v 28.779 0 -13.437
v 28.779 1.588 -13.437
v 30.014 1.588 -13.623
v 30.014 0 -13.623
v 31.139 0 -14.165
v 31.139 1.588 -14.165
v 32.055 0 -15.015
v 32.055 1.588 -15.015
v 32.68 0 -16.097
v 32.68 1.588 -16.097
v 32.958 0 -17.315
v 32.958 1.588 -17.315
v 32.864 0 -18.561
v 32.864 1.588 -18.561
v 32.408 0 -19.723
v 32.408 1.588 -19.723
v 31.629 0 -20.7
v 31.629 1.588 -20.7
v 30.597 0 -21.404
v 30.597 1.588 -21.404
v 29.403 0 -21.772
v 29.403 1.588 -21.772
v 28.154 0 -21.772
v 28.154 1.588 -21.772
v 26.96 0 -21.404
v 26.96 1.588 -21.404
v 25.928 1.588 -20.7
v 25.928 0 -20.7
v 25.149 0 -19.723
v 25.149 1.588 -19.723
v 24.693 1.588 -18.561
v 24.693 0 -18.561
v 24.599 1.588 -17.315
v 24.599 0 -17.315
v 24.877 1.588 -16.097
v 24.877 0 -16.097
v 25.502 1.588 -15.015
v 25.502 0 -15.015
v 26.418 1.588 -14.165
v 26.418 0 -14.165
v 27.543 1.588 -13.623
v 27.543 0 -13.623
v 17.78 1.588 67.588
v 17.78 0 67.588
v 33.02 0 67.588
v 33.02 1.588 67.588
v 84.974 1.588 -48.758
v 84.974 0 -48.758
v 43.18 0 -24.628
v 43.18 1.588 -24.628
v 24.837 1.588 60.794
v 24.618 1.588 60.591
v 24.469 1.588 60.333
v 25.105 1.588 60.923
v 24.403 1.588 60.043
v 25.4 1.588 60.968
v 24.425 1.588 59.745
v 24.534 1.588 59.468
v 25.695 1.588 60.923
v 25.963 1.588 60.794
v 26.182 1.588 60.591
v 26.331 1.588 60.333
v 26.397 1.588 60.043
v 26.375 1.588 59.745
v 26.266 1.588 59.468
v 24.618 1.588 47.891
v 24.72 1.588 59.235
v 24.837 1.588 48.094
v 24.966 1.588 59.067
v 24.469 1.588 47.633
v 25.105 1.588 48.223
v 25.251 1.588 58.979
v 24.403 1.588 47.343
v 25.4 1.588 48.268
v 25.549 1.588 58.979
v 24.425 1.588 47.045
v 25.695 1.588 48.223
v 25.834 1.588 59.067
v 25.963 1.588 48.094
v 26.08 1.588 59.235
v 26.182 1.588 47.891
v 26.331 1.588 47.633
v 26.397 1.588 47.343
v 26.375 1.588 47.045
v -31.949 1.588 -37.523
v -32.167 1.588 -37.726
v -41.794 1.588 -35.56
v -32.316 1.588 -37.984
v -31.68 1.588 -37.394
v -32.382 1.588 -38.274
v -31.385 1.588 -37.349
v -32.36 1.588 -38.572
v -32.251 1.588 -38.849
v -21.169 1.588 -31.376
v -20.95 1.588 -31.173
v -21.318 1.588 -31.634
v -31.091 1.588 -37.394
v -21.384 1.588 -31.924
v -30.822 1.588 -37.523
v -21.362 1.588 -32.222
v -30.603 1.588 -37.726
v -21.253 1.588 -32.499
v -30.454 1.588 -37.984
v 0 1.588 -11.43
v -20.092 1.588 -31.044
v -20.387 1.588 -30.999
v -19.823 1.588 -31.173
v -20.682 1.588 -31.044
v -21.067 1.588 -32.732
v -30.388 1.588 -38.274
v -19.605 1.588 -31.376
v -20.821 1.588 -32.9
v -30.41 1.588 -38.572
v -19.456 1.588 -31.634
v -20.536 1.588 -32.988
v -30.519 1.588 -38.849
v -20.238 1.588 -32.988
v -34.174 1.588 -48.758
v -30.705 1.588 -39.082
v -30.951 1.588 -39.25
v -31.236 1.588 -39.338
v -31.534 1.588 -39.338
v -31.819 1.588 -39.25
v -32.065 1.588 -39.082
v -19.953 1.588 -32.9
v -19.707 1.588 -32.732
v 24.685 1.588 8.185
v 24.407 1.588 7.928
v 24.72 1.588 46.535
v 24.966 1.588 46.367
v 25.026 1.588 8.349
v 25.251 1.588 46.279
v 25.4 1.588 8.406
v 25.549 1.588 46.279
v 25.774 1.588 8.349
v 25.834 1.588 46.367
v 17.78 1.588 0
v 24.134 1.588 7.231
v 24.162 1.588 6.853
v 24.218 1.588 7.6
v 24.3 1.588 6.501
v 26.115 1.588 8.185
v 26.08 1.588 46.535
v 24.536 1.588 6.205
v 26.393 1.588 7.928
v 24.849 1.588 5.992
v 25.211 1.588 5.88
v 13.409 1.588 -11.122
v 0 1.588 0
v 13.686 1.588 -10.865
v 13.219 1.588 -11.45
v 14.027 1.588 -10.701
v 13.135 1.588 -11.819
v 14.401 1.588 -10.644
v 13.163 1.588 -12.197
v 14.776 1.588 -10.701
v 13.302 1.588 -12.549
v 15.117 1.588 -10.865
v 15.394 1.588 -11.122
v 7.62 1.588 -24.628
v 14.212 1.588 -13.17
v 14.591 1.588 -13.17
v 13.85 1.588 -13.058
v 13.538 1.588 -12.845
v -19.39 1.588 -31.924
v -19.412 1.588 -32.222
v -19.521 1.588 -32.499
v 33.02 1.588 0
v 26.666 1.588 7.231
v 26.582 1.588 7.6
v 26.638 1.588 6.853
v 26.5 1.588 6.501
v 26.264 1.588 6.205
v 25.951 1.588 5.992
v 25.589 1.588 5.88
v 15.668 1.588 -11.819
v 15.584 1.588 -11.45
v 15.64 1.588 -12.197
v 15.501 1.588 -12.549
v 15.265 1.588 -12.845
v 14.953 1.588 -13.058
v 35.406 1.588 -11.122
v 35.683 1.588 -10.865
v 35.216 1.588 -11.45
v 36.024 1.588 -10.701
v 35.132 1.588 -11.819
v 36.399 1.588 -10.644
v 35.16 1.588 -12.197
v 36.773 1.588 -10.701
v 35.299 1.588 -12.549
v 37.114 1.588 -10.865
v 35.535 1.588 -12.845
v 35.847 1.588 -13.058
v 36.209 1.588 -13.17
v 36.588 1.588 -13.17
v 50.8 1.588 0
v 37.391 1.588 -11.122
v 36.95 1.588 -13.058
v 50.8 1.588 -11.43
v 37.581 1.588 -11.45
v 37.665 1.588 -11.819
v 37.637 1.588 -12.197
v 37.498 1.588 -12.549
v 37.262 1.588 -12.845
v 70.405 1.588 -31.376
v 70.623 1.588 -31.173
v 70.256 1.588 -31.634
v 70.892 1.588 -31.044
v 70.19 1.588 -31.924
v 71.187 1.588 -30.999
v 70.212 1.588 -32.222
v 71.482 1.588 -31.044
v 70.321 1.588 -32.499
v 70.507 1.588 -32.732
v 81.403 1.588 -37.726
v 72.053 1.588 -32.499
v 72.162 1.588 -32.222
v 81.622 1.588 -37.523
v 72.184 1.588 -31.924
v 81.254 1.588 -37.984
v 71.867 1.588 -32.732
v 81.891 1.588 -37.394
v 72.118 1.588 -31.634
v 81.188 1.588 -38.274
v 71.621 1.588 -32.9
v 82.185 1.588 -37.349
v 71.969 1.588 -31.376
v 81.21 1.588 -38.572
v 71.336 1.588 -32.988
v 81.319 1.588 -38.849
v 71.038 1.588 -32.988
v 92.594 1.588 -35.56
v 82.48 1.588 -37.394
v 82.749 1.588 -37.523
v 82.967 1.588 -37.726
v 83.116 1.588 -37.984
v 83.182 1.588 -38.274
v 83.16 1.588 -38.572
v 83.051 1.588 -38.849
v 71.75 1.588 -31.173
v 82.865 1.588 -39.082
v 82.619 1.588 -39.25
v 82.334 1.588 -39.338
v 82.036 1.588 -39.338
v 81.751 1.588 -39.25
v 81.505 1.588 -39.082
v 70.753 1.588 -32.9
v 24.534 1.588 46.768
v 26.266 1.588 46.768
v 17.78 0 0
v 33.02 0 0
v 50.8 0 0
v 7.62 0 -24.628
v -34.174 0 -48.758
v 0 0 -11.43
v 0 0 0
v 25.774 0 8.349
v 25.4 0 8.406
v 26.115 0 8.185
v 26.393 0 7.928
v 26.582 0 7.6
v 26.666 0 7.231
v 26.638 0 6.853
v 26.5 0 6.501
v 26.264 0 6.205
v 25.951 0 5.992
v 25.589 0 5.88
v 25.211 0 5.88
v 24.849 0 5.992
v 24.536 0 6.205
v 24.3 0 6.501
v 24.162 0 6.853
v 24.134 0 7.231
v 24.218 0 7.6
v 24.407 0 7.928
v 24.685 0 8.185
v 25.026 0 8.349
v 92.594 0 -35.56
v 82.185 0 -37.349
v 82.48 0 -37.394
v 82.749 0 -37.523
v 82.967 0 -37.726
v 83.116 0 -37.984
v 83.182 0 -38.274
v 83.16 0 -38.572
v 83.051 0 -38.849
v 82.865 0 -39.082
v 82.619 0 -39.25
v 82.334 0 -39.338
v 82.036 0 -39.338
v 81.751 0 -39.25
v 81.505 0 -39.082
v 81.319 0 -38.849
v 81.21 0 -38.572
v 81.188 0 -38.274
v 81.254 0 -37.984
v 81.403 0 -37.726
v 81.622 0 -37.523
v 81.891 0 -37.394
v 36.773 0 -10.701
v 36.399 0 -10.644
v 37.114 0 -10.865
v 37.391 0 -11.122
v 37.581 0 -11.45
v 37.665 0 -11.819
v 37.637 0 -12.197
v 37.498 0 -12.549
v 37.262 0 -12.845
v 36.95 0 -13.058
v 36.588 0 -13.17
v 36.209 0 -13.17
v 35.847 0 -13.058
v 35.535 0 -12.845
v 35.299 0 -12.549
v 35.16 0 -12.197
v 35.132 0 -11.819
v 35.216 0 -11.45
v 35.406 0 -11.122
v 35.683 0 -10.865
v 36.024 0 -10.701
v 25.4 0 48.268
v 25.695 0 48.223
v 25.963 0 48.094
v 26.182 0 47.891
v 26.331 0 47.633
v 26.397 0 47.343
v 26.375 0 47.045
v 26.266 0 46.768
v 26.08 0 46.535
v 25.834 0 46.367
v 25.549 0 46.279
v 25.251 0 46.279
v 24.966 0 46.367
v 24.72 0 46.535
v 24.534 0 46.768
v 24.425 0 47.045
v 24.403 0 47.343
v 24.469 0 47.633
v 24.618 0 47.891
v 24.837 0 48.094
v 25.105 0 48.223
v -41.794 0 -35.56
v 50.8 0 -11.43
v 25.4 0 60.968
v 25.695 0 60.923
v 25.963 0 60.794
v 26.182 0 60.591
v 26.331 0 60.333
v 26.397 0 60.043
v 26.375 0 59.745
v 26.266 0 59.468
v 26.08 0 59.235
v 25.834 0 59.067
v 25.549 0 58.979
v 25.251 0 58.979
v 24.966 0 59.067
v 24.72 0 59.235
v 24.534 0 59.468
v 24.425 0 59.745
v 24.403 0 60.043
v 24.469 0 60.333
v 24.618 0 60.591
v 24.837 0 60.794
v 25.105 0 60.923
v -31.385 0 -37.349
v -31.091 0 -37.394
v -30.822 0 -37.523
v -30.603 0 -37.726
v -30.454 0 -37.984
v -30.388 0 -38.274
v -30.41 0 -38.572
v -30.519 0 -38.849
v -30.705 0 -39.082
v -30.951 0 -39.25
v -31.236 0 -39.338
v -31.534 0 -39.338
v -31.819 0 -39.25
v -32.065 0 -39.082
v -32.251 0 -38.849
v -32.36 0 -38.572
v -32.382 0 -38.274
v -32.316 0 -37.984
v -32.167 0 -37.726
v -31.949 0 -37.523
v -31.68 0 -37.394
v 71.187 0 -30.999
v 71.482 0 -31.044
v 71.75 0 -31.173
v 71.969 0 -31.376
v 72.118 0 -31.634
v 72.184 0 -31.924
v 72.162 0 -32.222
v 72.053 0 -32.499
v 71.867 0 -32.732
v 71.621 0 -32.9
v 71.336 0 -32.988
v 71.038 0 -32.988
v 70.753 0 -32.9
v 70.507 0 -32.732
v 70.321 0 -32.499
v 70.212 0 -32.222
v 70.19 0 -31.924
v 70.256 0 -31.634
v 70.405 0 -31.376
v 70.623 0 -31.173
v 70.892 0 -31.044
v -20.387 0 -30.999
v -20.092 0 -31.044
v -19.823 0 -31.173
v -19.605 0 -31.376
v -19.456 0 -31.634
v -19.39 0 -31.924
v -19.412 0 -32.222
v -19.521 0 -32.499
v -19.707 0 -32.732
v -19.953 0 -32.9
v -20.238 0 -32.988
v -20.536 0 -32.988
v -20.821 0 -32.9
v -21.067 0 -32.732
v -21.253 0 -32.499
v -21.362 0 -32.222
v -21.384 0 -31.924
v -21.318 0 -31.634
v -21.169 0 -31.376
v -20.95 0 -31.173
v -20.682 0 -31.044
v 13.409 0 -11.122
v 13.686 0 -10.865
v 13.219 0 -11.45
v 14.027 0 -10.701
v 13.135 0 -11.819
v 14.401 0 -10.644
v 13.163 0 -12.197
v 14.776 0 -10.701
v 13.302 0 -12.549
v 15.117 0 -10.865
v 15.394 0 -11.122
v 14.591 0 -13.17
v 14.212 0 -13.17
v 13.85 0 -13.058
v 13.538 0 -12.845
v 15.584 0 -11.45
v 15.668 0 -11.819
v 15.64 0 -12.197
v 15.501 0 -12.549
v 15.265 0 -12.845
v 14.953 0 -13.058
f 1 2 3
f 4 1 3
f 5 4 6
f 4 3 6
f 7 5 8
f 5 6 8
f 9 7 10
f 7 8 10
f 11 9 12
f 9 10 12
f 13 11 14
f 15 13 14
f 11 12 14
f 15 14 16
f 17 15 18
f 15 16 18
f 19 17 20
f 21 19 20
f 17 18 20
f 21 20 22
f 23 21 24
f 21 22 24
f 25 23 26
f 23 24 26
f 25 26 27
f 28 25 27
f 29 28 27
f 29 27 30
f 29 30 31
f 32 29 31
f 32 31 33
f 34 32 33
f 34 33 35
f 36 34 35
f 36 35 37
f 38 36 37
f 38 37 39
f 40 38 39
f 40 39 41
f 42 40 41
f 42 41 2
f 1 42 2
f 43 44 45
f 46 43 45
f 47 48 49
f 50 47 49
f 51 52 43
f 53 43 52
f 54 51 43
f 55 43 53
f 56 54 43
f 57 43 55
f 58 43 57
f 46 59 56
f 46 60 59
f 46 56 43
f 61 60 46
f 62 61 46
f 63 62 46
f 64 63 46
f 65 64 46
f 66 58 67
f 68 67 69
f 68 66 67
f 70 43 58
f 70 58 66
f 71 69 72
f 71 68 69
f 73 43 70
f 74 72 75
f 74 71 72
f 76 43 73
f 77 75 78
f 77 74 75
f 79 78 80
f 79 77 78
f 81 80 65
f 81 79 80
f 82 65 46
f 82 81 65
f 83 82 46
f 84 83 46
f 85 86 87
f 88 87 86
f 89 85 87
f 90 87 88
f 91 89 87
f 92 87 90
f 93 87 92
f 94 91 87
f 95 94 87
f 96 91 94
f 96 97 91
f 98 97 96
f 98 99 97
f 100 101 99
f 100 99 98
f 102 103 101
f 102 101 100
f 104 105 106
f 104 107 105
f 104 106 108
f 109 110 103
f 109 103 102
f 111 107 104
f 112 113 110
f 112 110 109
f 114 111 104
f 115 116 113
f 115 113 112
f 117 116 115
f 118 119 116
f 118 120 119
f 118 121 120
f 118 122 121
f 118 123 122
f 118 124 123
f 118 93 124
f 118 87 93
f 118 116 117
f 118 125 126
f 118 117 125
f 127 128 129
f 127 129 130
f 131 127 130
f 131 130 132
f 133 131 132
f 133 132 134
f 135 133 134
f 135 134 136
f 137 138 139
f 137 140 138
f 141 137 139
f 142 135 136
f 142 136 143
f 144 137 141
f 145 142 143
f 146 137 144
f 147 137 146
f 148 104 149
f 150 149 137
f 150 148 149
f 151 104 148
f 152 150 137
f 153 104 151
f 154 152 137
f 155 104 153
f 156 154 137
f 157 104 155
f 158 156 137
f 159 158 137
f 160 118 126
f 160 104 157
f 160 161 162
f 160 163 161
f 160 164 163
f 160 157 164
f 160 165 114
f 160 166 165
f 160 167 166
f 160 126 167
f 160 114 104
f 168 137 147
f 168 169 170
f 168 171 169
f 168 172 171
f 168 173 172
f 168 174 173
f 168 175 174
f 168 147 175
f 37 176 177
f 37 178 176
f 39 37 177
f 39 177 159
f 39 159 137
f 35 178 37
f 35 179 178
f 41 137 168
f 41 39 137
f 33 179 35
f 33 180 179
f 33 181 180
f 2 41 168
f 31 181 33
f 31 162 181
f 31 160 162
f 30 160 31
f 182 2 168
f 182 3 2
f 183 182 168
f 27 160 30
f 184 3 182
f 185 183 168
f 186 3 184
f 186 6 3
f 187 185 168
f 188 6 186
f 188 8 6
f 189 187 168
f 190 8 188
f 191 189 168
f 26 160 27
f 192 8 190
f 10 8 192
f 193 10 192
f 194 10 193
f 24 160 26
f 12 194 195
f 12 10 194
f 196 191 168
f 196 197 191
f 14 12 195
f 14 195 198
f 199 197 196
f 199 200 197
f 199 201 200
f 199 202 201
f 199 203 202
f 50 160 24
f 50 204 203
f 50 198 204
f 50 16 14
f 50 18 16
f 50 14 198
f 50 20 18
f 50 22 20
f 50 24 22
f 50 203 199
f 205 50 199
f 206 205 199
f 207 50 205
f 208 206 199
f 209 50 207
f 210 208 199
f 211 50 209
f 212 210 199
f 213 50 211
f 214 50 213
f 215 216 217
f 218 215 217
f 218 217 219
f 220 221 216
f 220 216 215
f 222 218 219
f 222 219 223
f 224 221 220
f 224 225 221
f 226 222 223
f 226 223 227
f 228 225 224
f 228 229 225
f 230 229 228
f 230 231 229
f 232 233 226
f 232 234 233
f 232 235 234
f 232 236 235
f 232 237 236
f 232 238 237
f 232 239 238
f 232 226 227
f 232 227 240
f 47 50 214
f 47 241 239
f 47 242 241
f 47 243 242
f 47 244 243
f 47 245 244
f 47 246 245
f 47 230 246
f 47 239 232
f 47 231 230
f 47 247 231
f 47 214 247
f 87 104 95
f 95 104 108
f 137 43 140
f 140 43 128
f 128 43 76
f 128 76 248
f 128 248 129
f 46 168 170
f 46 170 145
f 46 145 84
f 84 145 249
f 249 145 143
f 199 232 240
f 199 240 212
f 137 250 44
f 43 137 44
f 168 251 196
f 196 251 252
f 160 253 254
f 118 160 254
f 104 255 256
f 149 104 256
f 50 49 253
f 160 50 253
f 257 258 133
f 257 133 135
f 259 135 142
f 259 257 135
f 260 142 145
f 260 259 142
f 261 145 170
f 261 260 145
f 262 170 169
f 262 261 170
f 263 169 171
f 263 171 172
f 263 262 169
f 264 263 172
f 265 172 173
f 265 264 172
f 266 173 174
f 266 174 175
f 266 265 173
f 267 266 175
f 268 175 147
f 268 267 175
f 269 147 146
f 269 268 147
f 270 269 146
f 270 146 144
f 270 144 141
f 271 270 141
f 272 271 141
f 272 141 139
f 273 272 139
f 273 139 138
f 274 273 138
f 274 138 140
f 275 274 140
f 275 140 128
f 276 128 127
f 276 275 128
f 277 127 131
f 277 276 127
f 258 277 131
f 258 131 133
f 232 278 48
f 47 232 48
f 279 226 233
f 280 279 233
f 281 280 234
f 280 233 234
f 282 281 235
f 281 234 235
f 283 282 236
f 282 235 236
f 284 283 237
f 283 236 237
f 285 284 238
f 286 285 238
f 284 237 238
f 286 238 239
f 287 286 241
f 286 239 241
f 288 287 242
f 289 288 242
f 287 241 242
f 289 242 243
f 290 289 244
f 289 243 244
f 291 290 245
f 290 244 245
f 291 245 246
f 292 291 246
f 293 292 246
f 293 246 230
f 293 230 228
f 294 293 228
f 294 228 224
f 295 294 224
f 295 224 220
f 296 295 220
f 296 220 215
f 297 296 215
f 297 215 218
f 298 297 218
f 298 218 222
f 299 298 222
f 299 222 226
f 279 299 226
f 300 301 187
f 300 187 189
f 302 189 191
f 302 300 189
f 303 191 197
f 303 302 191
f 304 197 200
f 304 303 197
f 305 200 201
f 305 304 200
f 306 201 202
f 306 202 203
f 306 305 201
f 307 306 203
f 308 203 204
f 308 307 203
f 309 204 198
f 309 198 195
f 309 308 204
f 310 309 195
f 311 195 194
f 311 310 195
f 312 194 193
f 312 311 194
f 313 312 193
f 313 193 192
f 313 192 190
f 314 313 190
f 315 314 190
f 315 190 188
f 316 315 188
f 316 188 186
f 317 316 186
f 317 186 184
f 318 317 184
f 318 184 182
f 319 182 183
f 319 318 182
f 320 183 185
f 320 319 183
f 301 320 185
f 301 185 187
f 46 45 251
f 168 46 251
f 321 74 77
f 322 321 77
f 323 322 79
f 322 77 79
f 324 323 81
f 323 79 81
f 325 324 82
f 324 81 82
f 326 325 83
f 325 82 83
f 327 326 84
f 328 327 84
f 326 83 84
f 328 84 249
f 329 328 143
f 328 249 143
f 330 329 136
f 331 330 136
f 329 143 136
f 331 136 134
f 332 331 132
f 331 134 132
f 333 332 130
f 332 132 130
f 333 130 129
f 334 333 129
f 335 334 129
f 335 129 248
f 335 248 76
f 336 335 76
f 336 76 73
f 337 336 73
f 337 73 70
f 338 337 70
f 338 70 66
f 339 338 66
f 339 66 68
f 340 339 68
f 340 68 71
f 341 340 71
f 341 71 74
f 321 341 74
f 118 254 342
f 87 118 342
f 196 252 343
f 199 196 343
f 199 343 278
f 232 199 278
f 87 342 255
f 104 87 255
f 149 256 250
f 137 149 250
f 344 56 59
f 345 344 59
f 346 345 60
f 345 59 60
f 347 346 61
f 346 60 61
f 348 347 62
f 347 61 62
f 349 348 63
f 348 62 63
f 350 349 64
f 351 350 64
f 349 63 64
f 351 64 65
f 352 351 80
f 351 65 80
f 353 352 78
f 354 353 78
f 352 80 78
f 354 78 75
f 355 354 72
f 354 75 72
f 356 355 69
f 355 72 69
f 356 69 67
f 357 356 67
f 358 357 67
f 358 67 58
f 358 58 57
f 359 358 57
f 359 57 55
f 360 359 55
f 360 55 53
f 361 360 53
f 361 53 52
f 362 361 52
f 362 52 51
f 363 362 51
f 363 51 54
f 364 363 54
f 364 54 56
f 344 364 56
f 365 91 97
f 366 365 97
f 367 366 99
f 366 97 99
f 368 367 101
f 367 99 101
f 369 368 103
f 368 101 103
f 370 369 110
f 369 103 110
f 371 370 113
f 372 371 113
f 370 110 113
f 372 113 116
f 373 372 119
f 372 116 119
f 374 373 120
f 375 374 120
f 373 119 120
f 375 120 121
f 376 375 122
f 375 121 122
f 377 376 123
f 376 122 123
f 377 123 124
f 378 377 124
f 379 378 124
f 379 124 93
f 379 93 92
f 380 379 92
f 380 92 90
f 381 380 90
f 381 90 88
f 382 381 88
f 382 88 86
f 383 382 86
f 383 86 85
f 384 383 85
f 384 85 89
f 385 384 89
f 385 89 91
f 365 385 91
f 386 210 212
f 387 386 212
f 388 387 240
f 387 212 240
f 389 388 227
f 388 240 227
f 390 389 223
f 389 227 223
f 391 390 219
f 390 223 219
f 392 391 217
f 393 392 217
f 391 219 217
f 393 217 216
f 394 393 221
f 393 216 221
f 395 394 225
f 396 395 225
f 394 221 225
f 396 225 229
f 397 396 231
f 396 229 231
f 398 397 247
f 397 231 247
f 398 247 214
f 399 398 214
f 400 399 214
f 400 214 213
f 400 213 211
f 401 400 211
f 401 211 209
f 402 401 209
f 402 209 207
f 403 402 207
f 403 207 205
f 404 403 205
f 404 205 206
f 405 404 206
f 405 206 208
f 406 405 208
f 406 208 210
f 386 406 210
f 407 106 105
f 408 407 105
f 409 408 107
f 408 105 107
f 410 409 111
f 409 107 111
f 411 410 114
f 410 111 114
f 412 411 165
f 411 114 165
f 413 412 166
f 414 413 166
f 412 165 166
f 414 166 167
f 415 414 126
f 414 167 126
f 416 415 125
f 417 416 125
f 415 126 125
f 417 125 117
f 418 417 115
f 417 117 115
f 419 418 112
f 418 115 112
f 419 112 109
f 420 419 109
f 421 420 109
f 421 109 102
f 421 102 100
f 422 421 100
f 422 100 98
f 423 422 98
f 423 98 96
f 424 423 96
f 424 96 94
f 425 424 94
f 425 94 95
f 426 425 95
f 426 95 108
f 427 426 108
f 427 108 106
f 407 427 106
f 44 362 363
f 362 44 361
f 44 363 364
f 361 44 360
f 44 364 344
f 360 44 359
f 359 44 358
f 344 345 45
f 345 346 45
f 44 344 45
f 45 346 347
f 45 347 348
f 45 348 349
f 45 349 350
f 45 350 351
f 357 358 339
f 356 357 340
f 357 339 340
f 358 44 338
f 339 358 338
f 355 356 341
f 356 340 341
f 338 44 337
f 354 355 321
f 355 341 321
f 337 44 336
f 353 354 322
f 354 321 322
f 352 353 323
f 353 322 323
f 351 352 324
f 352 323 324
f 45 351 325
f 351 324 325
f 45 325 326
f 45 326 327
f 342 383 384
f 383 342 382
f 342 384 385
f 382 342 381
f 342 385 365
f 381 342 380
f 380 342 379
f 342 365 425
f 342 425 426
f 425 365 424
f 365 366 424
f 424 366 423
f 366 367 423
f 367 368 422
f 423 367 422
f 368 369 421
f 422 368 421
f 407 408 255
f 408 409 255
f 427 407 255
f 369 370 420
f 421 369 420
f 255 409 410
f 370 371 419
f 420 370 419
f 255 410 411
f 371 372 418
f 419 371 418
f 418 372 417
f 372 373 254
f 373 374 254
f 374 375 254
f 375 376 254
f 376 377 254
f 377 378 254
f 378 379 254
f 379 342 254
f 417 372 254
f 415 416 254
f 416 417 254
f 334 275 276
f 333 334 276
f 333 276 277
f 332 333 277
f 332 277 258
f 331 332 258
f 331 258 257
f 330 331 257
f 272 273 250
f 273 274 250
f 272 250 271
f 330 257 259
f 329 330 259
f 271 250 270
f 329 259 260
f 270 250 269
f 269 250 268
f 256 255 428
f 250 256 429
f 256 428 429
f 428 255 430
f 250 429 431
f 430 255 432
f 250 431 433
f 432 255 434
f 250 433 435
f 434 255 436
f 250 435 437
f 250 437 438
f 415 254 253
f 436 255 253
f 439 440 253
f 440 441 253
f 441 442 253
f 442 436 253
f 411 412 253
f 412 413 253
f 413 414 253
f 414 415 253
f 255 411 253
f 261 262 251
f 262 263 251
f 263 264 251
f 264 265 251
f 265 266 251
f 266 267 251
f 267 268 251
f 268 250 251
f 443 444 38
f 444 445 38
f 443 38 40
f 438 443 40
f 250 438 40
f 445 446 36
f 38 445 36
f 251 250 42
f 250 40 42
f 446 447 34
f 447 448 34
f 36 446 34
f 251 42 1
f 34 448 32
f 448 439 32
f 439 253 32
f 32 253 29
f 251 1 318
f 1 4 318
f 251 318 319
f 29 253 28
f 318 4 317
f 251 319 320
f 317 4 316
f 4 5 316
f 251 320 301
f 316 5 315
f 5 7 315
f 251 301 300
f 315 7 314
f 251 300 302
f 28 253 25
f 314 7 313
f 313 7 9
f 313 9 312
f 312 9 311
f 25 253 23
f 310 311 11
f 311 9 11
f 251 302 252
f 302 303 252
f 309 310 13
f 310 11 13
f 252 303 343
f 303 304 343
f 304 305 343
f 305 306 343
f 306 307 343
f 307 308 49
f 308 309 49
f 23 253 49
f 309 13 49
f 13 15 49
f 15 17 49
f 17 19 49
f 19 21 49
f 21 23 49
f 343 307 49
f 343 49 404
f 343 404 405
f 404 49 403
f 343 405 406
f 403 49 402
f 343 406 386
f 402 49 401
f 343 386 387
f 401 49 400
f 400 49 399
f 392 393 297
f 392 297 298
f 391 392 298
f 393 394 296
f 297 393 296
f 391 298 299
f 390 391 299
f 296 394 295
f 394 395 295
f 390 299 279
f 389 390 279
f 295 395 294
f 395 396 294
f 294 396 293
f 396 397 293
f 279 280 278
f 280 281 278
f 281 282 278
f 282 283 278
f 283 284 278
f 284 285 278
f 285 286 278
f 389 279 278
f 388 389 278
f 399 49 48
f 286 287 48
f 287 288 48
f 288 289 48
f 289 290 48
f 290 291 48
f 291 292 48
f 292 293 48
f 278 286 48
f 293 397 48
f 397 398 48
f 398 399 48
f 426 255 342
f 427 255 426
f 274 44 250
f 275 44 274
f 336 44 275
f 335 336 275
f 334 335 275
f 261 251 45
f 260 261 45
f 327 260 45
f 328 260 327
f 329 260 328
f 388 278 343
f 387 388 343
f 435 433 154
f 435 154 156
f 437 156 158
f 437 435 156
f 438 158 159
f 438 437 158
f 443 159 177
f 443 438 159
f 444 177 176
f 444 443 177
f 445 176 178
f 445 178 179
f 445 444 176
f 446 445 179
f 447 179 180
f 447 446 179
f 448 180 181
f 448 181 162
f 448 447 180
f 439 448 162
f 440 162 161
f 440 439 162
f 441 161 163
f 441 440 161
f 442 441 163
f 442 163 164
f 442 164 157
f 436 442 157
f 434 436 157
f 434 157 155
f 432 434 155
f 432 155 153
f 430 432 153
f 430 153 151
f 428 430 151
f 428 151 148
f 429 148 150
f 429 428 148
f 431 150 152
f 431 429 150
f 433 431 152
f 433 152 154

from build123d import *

# Parameters (mm, degrees)
SKETCH1_R           = 1.27
BOSS_EXTRUDE2_DEPTH = 1.5875
SKETCH3_R           = 4.191
CUT_EXTRUDE1_DEPTH  = 2.54
SKETCH4_R           = 1
SKETCH4_R_2         = 0.999998
CUT_EXTRUDE2_DEPTH  = 2.54


with BuildPart() as part:
    # Sketch1 → Boss-Extrude2 (new body)
    with BuildSketch(Plane(origin=(0, 0, 0), x_dir=(1, 0, 0), z_dir=(0, 1, 0))):
        Polygon((-41.794385987, 35.56), (0, 11.43), (0, 0), (17.78, 0), (17.78, -67.587878735), (33.02, -67.587878735), (33.02, 0), (50.8, 0), (50.8, 11.43), (92.594385987, 35.56), (84.974385987, 48.758227154), (43.18, 24.628227154), (7.62, 24.628227154), (-34.174385987, 48.758227154), align=None)
        with Locations(Location((36.398522628, 11.914121265, 0), (0, 0, 270))):
            Circle(SKETCH1_R, mode=Mode.SUBTRACT)
        with Locations(Location((14.401477372, 11.914121265, 0), (0, 0, 270))):
            Circle(SKETCH1_R, mode=Mode.SUBTRACT)
        with Locations(Location((25.4, -7.135878735, 0), (0, 0, 270))):
            Circle(SKETCH1_R, mode=Mode.SUBTRACT)
    extrude(amount=BOSS_EXTRUDE2_DEPTH)

    # Sketch3 → Cut-Extrude1 (cut)
    with BuildSketch(Plane(origin=(0, 1.5875, 0), x_dir=(1, 0, 0), z_dir=(0, 1, 0))):
        with Locations(Location((28.778522628, 17.627987154, 0), (0, 0, 270))):
            Circle(SKETCH3_R)
    extrude(amount=-CUT_EXTRUDE1_DEPTH, mode=Mode.SUBTRACT)

    # Sketch4 → Cut-Extrude2 (cut)
    with BuildSketch(Plane(origin=(0, 1.5875, 0), x_dir=(1, 0, 0), z_dir=(0, 1, 0))):
        with Locations(Location((25.4, -59.967878735, 0), (0, 0, 270))):
            Circle(SKETCH4_R)
        with Locations(Location((25.4, -47.267878735, 0), (0, 0, 270))):
            Circle(SKETCH4_R_2)
        with Locations(Location((-20.386749782, 31.999113577, 0), (0, 0, 270))):
            Circle(SKETCH4_R)
        with Locations(Location((-31.38527241, 38.349113577, 0), (0, 0, 270))):
            Circle(SKETCH4_R)
        with Locations(Location((82.18527241, 38.349113577, 0), (0, 0, 270))):
            Circle(SKETCH4_R)
        with Locations(Location((71.186749782, 31.999113577, 0), (0, 0, 270))):
            Circle(SKETCH4_R)
    extrude(amount=-CUT_EXTRUDE2_DEPTH, mode=Mode.SUBTRACT)


solid = part.part
